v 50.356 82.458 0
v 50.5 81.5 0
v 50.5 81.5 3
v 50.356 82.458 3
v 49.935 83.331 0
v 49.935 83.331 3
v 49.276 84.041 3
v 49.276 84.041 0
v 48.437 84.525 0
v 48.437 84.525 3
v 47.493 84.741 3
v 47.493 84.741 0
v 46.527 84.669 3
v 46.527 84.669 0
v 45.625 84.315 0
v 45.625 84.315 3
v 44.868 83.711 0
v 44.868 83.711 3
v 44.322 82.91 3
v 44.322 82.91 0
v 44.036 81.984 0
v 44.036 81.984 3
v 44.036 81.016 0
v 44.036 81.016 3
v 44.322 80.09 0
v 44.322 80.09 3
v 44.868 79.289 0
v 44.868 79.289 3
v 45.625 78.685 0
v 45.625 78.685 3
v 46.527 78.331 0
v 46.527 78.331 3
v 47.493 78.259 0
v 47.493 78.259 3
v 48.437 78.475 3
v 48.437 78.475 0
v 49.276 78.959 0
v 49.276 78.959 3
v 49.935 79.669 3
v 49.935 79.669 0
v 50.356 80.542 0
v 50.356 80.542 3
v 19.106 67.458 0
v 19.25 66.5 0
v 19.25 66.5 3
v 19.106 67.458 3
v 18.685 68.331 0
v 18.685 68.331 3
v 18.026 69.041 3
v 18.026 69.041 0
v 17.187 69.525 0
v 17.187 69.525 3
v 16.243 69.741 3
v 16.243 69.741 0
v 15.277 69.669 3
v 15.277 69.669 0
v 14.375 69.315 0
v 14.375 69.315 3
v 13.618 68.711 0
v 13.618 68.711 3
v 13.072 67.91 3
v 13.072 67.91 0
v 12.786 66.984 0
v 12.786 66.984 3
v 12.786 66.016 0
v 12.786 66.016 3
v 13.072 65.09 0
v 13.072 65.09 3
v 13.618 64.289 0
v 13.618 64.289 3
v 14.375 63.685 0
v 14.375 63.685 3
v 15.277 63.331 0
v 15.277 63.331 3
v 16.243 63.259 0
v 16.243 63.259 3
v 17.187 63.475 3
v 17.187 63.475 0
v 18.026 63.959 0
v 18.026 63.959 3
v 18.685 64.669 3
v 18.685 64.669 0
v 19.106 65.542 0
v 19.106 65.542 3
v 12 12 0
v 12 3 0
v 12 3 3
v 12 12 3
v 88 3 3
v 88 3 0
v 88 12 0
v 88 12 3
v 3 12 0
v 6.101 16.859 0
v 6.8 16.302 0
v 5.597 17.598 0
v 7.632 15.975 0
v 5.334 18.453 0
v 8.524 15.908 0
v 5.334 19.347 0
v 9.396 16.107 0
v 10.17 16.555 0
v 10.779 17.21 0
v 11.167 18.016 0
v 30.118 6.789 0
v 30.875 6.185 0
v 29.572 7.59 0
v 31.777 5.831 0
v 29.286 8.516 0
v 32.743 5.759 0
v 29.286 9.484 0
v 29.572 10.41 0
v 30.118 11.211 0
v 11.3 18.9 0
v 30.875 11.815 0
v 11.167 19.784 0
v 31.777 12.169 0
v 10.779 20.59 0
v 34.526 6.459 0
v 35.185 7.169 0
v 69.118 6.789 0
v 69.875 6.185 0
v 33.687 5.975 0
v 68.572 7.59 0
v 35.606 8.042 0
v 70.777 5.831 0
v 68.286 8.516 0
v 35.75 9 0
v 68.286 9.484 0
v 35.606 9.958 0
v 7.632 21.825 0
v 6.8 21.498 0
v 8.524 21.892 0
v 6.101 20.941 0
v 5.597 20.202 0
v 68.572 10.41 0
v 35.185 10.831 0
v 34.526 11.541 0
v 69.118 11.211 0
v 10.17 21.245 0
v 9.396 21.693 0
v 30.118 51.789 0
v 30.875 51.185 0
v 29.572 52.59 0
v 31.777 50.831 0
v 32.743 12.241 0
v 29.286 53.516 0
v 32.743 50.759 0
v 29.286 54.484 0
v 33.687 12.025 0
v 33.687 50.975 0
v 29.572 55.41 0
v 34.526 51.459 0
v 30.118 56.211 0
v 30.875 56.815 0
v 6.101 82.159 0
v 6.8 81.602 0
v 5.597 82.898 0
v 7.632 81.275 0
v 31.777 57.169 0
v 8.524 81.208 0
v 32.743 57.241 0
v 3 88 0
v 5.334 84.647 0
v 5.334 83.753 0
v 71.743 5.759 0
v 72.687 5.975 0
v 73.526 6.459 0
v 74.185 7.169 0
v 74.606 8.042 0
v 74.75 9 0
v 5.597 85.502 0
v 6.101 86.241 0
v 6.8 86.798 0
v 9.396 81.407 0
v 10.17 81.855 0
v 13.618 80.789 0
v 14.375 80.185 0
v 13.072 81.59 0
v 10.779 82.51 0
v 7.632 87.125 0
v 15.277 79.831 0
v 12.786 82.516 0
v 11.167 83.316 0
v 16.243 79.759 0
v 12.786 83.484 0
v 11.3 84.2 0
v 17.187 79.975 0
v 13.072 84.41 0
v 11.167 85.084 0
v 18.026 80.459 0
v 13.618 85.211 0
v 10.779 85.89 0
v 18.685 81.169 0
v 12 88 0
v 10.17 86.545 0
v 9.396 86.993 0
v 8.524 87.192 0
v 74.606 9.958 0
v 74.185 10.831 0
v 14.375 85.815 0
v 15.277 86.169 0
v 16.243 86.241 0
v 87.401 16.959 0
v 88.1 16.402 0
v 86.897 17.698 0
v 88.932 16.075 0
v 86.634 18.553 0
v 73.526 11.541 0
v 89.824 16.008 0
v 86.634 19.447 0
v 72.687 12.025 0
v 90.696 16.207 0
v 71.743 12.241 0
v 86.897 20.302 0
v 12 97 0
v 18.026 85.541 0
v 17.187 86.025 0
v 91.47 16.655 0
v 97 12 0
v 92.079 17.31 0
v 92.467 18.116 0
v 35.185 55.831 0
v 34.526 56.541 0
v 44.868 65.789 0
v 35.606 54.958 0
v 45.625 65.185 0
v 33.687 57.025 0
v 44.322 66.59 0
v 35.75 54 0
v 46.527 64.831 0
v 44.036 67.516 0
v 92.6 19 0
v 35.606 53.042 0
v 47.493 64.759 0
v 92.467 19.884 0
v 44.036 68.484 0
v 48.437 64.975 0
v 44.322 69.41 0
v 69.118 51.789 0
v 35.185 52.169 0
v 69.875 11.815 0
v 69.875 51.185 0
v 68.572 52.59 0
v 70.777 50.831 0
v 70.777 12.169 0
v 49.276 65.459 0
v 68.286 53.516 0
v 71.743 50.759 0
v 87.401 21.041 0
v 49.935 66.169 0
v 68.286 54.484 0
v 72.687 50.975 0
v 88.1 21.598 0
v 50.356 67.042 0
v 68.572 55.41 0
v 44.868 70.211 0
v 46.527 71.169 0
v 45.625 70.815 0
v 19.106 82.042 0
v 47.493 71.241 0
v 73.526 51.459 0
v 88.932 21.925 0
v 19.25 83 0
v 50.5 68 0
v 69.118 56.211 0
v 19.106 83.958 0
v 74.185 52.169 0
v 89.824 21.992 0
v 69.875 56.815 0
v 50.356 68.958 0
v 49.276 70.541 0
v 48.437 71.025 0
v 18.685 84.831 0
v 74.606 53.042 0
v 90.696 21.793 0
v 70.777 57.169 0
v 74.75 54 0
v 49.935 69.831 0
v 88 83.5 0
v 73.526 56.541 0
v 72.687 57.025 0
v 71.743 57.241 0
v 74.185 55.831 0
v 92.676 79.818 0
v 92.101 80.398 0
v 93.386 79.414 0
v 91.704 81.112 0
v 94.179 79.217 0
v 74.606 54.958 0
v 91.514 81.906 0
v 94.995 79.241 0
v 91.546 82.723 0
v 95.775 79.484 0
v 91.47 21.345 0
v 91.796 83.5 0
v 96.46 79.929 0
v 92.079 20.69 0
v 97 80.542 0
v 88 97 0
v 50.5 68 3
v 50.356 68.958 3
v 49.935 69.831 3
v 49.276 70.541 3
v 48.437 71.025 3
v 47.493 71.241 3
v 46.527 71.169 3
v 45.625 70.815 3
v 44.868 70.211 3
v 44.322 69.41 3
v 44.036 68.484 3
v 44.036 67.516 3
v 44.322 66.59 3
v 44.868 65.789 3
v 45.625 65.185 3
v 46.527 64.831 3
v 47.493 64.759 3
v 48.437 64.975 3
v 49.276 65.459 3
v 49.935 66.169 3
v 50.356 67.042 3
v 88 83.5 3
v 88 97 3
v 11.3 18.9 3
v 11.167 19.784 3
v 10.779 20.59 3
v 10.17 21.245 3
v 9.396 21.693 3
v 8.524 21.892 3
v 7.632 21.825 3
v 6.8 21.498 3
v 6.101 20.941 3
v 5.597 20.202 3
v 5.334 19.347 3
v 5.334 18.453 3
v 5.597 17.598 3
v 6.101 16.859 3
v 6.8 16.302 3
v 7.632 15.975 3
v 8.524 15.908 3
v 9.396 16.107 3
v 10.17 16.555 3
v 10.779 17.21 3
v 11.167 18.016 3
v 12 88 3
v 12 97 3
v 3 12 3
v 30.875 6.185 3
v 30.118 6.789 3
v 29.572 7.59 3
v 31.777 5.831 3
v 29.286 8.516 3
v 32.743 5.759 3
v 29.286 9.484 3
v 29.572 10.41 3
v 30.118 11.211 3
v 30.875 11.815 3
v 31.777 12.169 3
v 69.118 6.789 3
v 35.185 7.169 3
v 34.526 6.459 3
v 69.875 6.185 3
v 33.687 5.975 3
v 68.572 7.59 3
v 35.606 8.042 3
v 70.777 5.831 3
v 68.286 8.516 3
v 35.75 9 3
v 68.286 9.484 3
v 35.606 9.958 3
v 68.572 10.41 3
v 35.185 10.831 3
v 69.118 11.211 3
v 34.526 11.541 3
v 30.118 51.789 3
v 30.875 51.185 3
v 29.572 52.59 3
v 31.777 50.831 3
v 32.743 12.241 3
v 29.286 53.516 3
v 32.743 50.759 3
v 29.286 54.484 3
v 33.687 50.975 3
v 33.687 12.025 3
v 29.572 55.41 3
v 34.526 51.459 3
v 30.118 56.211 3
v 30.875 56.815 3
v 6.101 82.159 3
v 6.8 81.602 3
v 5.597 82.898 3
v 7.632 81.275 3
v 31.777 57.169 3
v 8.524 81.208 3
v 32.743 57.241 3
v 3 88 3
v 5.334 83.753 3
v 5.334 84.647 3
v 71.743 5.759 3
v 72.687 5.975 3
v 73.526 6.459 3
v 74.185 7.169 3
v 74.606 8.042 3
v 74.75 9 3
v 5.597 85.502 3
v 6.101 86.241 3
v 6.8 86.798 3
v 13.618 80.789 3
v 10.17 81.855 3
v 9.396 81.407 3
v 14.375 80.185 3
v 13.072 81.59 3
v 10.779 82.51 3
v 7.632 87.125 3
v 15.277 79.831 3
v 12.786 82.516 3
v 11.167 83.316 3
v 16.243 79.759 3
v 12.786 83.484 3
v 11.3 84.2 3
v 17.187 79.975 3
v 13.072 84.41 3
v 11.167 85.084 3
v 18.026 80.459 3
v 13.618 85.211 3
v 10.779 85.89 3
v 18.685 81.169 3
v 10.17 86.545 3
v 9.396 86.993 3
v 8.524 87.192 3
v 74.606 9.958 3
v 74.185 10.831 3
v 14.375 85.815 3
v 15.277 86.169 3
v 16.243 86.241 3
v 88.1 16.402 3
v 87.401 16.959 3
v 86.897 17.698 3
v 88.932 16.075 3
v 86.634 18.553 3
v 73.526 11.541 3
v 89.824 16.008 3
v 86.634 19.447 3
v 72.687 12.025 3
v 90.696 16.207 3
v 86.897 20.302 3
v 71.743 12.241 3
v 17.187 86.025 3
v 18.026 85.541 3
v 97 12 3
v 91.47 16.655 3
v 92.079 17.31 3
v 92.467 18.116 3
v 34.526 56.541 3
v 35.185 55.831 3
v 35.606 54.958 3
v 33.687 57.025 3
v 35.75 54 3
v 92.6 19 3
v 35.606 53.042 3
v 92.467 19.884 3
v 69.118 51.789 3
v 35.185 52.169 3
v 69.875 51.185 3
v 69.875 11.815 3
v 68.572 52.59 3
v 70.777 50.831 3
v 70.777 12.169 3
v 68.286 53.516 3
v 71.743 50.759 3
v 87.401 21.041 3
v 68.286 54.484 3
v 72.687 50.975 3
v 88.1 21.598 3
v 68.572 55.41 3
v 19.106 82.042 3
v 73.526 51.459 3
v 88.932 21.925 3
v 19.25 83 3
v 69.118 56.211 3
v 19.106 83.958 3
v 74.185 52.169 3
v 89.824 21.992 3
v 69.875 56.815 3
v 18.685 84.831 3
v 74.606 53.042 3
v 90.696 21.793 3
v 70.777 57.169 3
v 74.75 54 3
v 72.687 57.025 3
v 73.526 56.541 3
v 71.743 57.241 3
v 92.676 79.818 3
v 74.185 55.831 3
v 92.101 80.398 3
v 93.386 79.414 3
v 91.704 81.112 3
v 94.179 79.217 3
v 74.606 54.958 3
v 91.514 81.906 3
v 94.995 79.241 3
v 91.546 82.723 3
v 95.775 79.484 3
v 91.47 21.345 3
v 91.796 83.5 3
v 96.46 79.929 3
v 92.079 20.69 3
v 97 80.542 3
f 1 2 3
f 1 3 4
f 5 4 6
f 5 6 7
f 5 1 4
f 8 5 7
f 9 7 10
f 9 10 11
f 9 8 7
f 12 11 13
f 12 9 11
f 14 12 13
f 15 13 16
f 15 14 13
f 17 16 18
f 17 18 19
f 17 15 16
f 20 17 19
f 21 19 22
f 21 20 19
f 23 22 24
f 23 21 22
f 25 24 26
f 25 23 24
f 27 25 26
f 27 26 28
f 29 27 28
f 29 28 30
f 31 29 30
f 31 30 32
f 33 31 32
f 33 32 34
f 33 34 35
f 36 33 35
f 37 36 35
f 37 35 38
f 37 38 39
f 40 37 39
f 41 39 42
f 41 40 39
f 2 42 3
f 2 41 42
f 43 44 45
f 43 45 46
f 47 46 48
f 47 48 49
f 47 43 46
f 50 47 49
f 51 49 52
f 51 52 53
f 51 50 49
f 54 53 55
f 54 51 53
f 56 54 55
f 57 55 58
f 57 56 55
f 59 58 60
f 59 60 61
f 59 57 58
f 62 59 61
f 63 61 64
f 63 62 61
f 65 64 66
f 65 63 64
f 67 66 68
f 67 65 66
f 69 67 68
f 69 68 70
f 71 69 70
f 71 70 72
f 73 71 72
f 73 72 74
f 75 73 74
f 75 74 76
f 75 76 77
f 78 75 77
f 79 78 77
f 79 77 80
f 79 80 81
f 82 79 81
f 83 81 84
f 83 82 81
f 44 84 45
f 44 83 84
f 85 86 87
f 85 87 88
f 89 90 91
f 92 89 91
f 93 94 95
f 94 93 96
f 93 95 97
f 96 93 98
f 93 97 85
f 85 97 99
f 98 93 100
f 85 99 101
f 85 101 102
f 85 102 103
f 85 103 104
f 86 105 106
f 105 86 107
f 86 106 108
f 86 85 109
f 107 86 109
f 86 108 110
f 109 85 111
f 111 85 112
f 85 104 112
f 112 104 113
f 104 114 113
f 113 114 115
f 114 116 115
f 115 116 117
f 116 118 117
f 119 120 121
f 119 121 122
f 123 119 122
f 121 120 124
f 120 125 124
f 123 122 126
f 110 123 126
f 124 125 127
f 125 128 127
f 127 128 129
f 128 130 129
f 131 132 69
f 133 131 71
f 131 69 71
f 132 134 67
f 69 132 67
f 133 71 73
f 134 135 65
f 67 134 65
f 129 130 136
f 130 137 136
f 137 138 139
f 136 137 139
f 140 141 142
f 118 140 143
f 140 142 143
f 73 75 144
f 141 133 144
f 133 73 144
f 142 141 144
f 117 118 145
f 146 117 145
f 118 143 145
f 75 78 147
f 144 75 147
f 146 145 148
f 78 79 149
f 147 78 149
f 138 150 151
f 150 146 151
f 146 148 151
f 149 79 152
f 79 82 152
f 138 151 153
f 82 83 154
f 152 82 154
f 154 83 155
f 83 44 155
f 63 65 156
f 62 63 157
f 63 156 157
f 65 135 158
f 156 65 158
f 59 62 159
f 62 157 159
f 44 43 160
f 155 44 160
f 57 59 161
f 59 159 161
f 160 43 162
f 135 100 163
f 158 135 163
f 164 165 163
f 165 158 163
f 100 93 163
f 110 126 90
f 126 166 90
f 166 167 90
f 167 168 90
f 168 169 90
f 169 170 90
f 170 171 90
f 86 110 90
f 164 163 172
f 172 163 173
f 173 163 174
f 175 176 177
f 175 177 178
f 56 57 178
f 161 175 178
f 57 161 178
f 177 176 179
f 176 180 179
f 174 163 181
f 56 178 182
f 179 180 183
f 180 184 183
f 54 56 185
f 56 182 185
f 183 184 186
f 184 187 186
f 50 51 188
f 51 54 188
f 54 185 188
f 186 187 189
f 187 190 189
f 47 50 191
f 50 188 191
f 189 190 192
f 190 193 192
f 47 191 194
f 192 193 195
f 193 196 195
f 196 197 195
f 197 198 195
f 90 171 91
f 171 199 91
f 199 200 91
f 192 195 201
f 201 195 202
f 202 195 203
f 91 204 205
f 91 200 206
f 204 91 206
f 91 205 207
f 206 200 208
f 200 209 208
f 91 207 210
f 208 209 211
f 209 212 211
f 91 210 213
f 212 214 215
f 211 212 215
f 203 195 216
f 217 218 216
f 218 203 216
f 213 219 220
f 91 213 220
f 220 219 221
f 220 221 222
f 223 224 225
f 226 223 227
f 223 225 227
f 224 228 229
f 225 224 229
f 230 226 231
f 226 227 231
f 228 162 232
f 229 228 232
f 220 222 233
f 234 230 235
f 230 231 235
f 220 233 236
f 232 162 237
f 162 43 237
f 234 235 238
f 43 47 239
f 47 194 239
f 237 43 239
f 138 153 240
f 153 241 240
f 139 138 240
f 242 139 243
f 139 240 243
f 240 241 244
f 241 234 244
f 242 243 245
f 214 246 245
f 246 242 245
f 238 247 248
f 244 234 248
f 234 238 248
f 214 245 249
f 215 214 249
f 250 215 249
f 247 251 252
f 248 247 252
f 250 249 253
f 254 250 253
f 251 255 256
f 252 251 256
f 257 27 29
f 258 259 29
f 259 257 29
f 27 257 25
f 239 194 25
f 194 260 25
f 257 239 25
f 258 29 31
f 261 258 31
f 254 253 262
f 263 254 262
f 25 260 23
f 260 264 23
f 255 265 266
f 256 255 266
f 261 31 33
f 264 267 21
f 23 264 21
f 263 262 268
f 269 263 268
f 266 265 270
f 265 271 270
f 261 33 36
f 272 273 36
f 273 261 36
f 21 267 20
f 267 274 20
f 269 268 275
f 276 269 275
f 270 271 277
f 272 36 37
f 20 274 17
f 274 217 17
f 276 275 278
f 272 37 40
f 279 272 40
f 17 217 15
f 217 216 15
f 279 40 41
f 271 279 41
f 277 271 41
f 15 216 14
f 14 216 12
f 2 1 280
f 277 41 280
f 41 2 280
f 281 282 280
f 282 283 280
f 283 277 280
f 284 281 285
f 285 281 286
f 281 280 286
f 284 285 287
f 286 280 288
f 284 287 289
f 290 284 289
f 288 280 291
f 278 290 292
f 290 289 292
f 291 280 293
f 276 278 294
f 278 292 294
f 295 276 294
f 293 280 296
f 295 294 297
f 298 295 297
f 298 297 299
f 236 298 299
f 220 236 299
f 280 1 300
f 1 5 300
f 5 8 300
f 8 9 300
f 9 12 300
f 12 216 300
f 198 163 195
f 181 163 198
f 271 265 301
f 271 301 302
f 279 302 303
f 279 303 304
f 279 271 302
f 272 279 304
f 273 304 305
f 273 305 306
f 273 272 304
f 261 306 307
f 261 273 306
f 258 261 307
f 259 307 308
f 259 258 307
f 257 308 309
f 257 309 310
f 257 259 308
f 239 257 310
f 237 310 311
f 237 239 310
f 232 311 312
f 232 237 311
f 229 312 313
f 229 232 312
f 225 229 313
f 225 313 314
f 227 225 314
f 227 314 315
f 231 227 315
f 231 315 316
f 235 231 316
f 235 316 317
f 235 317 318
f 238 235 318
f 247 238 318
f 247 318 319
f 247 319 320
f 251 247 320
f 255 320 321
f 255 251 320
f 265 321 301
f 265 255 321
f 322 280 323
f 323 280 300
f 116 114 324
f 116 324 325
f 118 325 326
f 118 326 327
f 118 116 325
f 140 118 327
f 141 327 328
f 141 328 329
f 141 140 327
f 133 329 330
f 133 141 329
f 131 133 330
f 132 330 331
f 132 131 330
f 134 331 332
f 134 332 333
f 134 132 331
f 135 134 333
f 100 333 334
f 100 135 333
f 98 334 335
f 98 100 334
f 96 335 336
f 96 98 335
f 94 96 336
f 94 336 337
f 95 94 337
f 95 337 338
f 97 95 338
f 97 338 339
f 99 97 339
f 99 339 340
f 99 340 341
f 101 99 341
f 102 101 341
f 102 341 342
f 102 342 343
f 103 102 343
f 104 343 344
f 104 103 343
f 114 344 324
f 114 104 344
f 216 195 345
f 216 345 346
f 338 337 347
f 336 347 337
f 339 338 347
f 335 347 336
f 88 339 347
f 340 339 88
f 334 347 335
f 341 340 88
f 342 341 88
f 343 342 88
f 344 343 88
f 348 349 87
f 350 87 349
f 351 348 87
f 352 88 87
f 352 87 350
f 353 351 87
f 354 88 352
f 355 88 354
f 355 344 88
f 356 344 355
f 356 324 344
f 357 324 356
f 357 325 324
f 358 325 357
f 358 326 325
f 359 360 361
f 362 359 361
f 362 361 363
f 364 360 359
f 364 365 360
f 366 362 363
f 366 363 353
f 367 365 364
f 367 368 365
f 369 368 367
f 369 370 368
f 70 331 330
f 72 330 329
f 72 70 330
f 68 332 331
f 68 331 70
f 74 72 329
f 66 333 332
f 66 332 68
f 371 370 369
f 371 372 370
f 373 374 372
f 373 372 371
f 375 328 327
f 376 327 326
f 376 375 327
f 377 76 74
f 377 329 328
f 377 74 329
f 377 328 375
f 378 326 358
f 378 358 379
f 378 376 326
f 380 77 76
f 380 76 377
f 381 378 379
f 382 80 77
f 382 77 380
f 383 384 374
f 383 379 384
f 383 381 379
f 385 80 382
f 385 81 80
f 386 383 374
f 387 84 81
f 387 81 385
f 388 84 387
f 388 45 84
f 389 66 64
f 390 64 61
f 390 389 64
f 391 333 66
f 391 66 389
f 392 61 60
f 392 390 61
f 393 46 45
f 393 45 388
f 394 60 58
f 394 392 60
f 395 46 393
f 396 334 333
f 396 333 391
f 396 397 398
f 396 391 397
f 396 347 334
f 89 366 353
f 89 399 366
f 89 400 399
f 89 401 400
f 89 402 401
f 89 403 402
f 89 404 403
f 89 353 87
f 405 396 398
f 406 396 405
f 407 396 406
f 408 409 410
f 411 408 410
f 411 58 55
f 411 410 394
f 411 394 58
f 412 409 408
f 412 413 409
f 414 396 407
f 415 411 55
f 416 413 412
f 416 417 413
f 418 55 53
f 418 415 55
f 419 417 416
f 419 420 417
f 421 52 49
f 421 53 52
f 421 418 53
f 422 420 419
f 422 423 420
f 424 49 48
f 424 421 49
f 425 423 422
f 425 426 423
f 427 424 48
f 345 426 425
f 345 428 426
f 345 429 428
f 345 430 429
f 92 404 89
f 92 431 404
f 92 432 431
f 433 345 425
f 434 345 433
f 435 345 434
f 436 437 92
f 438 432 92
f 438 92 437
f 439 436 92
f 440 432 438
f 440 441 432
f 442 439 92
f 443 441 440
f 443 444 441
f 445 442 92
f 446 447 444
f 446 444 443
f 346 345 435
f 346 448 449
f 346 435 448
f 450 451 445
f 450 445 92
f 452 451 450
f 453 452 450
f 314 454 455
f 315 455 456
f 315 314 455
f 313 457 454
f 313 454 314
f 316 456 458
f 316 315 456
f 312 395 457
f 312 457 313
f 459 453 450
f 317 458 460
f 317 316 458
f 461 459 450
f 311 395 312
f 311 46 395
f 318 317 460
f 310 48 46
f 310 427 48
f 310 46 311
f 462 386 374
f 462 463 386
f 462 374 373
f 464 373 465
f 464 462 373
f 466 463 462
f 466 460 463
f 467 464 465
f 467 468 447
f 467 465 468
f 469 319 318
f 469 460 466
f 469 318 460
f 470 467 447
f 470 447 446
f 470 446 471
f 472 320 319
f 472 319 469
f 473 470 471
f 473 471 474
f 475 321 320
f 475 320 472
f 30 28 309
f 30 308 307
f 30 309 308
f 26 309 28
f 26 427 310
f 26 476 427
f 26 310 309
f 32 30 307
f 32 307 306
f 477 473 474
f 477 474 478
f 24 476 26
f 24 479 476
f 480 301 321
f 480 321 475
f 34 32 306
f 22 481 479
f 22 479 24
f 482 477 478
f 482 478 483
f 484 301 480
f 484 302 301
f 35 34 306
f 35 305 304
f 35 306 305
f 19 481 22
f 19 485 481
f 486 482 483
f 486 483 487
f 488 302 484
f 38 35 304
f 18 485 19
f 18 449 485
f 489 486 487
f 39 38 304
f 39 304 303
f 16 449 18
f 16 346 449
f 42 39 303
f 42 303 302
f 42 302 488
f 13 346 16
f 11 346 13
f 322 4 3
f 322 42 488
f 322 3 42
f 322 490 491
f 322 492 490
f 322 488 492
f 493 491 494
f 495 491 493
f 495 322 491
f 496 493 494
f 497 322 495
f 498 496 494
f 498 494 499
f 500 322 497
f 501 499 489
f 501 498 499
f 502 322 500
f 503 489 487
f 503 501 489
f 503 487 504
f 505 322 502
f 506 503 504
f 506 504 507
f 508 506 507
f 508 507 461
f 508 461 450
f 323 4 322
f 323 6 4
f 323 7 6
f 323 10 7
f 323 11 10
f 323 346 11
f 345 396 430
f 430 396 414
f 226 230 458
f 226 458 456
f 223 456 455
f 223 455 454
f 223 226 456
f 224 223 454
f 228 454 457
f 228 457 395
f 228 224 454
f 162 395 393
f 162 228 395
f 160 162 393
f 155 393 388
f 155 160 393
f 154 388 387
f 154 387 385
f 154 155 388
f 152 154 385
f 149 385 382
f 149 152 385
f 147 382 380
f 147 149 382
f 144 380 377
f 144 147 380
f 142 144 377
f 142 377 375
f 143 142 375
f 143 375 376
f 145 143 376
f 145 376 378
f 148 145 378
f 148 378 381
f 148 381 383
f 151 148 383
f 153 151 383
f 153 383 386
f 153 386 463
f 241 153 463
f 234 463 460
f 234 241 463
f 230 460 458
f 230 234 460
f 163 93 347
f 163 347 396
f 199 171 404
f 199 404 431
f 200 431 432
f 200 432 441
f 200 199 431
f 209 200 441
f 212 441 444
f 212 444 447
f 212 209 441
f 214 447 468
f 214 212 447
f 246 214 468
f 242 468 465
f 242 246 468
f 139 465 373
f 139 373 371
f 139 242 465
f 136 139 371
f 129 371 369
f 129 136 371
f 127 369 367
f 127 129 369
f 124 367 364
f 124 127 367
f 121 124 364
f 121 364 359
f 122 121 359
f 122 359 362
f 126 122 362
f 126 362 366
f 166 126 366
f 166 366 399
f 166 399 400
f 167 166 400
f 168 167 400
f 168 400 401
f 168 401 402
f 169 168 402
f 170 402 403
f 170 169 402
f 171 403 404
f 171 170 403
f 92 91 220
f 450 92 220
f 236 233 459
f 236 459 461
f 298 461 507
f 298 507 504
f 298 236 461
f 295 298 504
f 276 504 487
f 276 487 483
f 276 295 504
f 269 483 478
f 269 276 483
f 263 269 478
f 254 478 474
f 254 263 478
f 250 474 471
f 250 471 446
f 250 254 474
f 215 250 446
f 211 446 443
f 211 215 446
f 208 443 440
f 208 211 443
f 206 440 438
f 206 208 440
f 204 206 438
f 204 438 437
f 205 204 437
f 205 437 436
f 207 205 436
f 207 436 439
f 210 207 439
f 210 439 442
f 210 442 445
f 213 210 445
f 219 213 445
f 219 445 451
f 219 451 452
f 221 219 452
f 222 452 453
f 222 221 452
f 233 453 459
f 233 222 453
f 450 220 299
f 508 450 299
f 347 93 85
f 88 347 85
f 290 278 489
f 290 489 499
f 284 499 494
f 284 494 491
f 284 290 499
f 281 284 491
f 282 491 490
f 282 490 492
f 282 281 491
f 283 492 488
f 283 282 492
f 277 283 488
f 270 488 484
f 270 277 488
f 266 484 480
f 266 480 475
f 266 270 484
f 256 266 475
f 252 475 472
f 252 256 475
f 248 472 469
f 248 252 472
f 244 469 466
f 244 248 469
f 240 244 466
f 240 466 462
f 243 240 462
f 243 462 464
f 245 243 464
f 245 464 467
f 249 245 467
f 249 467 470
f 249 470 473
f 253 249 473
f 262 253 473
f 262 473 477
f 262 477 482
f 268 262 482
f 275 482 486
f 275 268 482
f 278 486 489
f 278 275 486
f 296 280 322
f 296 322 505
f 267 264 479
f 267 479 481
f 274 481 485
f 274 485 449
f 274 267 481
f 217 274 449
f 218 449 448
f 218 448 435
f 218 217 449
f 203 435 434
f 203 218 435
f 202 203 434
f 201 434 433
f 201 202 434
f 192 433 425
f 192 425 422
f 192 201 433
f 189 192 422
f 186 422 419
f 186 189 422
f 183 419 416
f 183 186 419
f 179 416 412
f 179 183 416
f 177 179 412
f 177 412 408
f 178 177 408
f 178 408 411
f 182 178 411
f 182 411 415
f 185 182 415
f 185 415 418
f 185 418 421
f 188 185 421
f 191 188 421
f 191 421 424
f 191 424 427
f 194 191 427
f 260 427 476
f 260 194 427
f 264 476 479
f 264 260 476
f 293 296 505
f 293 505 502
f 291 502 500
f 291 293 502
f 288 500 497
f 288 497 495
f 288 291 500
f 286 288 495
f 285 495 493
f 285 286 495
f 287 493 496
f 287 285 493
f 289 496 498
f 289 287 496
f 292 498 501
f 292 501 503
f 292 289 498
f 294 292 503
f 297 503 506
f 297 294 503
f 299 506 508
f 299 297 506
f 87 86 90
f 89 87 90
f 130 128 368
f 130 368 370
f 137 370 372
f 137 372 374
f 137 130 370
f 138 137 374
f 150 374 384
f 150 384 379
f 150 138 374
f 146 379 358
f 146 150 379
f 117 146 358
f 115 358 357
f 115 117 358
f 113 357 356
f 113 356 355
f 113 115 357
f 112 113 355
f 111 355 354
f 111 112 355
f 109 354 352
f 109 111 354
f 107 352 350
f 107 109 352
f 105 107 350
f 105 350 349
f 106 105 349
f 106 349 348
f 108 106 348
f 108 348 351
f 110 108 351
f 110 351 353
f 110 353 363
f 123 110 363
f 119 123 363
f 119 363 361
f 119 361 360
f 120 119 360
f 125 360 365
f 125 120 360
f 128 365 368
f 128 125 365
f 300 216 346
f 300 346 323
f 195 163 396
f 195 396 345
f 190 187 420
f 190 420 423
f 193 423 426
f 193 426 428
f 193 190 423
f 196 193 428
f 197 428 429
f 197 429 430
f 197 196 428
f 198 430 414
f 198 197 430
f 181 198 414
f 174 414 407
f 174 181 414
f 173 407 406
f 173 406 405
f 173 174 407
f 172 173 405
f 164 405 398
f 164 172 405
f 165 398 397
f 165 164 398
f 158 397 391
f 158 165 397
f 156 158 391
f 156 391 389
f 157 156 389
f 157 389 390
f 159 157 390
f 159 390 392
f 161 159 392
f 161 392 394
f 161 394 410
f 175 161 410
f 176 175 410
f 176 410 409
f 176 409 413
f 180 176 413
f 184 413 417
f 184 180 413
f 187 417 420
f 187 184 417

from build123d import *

# Parameters (mm, degrees)
CYLINDER046_R     = 3.25
CYLINDER046_DEPTH = 3
CYLINDER044_R     = 3.25
CYLINDER044_DEPTH = 3
CYLINDER047_R     = 3.25
CYLINDER047_DEPTH = 3
CYLINDER050_R     = 3.25
CYLINDER050_DEPTH = 3
CYLINDER049_R     = 3.25
CYLINDER049_DEPTH = 3
CYLINDER045_R     = 3.25
CYLINDER045_DEPTH = 3
CYLINDER048_R     = 3.25
CYLINDER048_DEPTH = 3
CYLINDER051_R     = 3.25
CYLINDER051_DEPTH = 3
BOX006_W          = 10
BOX006_H          = 10
BOX006_DEPTH      = 3
CYLINDER008_R     = 3
CYLINDER008_DEPTH = 3
CYLINDER009_R     = 3
CYLINDER009_DEPTH = 3
CYLINDER010_R     = 3
CYLINDER010_DEPTH = 3
CYLINDER011_R     = 3
CYLINDER011_DEPTH = 3
BOX003_W          = 12
BOX003_H          = 12
BOX003_DEPTH      = 3
BOX004_W          = 12
BOX004_H          = 12
BOX004_DEPTH      = 3
BOX005_W          = 12
BOX005_H          = 12
BOX005_DEPTH      = 3
BOX002_W          = 12
BOX002_H          = 12
BOX002_DEPTH      = 3
BOX001_W          = 94
BOX001_H          = 94
BOX001_DEPTH      = 3


with BuildPart() as cylinder046:
    # Cylinder046 → Cylinder046 (new body)
    with BuildSketch(Plane(origin=(32.5, 54, 0), x_dir=(1, 0, 0), z_dir=(0, 0, 1))):
        Circle(CYLINDER046_R)
    extrude(amount=CYLINDER046_DEPTH)


with BuildPart() as cylinder044:
    # Cylinder044 → Cylinder044 (new body)
    with BuildSketch(Plane(origin=(32.5, 9, 0), x_dir=(1, 0, 0), z_dir=(0, 0, 1))):
        Circle(CYLINDER044_R)
    extrude(amount=CYLINDER044_DEPTH)


with BuildPart() as cylinder047:
    # Cylinder047 → Cylinder047 (new body)
    with BuildSketch(Plane(origin=(47.25, 68, 0), x_dir=(1, 0, 0), z_dir=(0, 0, 1))):
        Circle(CYLINDER047_R)
    extrude(amount=CYLINDER047_DEPTH)


with BuildPart() as cylinder050:
    # Cylinder050 → Cylinder050 (new body)
    with BuildSketch(Plane(origin=(16, 66.5, 0), x_dir=(1, 0, 0), z_dir=(0, 0, 1))):
        Circle(CYLINDER050_R)
    extrude(amount=CYLINDER050_DEPTH)


with BuildPart() as cylinder049:
    # Cylinder049 → Cylinder049 (new body)
    with BuildSketch(Plane(origin=(47.25, 81.5, 0), x_dir=(1, 0, 0), z_dir=(0, 0, 1))):
        Circle(CYLINDER049_R)
    extrude(amount=CYLINDER049_DEPTH)


with BuildPart() as cylinder045:
    # Cylinder045 → Cylinder045 (new body)
    with BuildSketch(Plane(origin=(71.5, 9, 0), x_dir=(1, 0, 0), z_dir=(0, 0, 1))):
        Circle(CYLINDER045_R)
    extrude(amount=CYLINDER045_DEPTH)


with BuildPart() as cylinder048:
    # Cylinder048 → Cylinder048 (new body)
    with BuildSketch(Plane(origin=(71.5, 54, 0), x_dir=(1, 0, 0), z_dir=(0, 0, 1))):
        Circle(CYLINDER048_R)
    extrude(amount=CYLINDER048_DEPTH)


with BuildPart() as fusion026:
    # Cylinder051 → Cylinder051 (new body)
    with BuildSketch(Plane(origin=(16, 83, 0), x_dir=(1, 0, 0), z_dir=(0, 0, 1))):
        Circle(CYLINDER051_R)
    extrude(amount=CYLINDER051_DEPTH)

    # Fusion026: union Cylinder046, Cylinder044, Cylinder047, Cylinder050, Cylinder049, Cylinder045, Cylinder048
    add(cylinder046.part)
    add(cylinder044.part)
    add(cylinder047.part)
    add(cylinder050.part)
    add(cylinder049.part)
    add(cylinder045.part)
    add(cylinder048.part)


with BuildPart() as cube005:
    # Box006 → Box006 (new body)
    with BuildSketch(Plane(origin=(88, 83.5, 0), x_dir=(1, 0, 0), z_dir=(0, 0, 1))):
        with Locations((5, 5)):
            Rectangle(BOX006_W, BOX006_H)
    extrude(amount=BOX006_DEPTH)


with BuildPart() as main_ata_board_mounting_screws004:
    # Cylinder008 → Cylinder008 (new body)
    with BuildSketch(Plane(origin=(8.3, 18.9, 0), x_dir=(1, 0, 0), z_dir=(0, 0, 1))):
        Circle(CYLINDER008_R)
    extrude(amount=CYLINDER008_DEPTH)


with BuildPart() as main_ata_board_mounting_screws005:
    # Cylinder009 → Cylinder009 (new body)
    with BuildSketch(Plane(origin=(8.3, 84.2, 0), x_dir=(1, 0, 0), z_dir=(0, 0, 1))):
        Circle(CYLINDER009_R)
    extrude(amount=CYLINDER009_DEPTH)


with BuildPart() as main_ata_board_mounting_screws006:
    # Cylinder010 → Cylinder010 (new body)
    with BuildSketch(Plane(origin=(89.6, 19, 0), x_dir=(1, 0, 0), z_dir=(0, 0, 1))):
        Circle(CYLINDER010_R)
    extrude(amount=CYLINDER010_DEPTH)


with BuildPart() as ata_board_mounting_screwholes:
    # Cylinder011 → Cylinder011 (new body)
    with BuildSketch(Plane(origin=(94.5, 82.2, 0), x_dir=(1, 0, 0), z_dir=(0, 0, 1))):
        Circle(CYLINDER011_R)
    extrude(amount=CYLINDER011_DEPTH)

    # Fusion004: union Main ATA Board Mounting Screws004, Main ATA Board Mounting Screws005, Main ATA Board Mounting Screws006
    add(main_ata_board_mounting_screws004.part)
    add(main_ata_board_mounting_screws005.part)
    add(main_ata_board_mounting_screws006.part)


with BuildPart() as cube002:
    # Box003 → Box003 (new body)
    with BuildSketch(Plane(origin=(88, 0, 0), x_dir=(1, 0, 0), z_dir=(0, 0, 1))):
        with Locations((6, 6)):
            Rectangle(BOX003_W, BOX003_H)
    extrude(amount=BOX003_DEPTH)


with BuildPart() as cube003:
    # Box004 → Box004 (new body)
    with BuildSketch(Plane(origin=(88, 88, 0), x_dir=(1, 0, 0), z_dir=(0, 0, 1))):
        with Locations((6, 6)):
            Rectangle(BOX004_W, BOX004_H)
    extrude(amount=BOX004_DEPTH)


with BuildPart() as cube004:
    # Box005 → Box005 (new body)
    with BuildSketch(Plane(origin=(0, 88, 0), x_dir=(1, 0, 0), z_dir=(0, 0, 1))):
        with Locations((6, 6)):
            Rectangle(BOX005_W, BOX005_H)
    extrude(amount=BOX005_DEPTH)


with BuildPart() as fusion003:
    # Box002 → Box002 (new body)
    with BuildSketch(Plane.XY):
        with Locations((6, 6)):
            Rectangle(BOX002_W, BOX002_H)
    extrude(amount=BOX002_DEPTH)

    # Fusion003: union Cube002, Cube003, Cube004
    add(cube002.part)
    add(cube003.part)
    add(cube004.part)


with BuildPart() as backplate_with_nut_recesses:
    # Box001 → Box001 (new body)
    with BuildSketch(Plane(origin=(3, 3, 0), x_dir=(1, 0, 0), z_dir=(0, 0, 1))):
        with Locations((47, 47)):
            Rectangle(BOX001_W, BOX001_H)
    extrude(amount=BOX001_DEPTH)

    # Cut001: cut Fusion003
    add(fusion003.part, mode=Mode.SUBTRACT)

    # Cut002: cut ATA Board mounting screwholes
    add(ata_board_mounting_screwholes.part, mode=Mode.SUBTRACT)

    # Cut003: cut Cube005
    add(cube005.part, mode=Mode.SUBTRACT)

    # Cut014: cut Fusion026
    add(fusion026.part, mode=Mode.SUBTRACT)


solid = backplate_with_nut_recesses.part
